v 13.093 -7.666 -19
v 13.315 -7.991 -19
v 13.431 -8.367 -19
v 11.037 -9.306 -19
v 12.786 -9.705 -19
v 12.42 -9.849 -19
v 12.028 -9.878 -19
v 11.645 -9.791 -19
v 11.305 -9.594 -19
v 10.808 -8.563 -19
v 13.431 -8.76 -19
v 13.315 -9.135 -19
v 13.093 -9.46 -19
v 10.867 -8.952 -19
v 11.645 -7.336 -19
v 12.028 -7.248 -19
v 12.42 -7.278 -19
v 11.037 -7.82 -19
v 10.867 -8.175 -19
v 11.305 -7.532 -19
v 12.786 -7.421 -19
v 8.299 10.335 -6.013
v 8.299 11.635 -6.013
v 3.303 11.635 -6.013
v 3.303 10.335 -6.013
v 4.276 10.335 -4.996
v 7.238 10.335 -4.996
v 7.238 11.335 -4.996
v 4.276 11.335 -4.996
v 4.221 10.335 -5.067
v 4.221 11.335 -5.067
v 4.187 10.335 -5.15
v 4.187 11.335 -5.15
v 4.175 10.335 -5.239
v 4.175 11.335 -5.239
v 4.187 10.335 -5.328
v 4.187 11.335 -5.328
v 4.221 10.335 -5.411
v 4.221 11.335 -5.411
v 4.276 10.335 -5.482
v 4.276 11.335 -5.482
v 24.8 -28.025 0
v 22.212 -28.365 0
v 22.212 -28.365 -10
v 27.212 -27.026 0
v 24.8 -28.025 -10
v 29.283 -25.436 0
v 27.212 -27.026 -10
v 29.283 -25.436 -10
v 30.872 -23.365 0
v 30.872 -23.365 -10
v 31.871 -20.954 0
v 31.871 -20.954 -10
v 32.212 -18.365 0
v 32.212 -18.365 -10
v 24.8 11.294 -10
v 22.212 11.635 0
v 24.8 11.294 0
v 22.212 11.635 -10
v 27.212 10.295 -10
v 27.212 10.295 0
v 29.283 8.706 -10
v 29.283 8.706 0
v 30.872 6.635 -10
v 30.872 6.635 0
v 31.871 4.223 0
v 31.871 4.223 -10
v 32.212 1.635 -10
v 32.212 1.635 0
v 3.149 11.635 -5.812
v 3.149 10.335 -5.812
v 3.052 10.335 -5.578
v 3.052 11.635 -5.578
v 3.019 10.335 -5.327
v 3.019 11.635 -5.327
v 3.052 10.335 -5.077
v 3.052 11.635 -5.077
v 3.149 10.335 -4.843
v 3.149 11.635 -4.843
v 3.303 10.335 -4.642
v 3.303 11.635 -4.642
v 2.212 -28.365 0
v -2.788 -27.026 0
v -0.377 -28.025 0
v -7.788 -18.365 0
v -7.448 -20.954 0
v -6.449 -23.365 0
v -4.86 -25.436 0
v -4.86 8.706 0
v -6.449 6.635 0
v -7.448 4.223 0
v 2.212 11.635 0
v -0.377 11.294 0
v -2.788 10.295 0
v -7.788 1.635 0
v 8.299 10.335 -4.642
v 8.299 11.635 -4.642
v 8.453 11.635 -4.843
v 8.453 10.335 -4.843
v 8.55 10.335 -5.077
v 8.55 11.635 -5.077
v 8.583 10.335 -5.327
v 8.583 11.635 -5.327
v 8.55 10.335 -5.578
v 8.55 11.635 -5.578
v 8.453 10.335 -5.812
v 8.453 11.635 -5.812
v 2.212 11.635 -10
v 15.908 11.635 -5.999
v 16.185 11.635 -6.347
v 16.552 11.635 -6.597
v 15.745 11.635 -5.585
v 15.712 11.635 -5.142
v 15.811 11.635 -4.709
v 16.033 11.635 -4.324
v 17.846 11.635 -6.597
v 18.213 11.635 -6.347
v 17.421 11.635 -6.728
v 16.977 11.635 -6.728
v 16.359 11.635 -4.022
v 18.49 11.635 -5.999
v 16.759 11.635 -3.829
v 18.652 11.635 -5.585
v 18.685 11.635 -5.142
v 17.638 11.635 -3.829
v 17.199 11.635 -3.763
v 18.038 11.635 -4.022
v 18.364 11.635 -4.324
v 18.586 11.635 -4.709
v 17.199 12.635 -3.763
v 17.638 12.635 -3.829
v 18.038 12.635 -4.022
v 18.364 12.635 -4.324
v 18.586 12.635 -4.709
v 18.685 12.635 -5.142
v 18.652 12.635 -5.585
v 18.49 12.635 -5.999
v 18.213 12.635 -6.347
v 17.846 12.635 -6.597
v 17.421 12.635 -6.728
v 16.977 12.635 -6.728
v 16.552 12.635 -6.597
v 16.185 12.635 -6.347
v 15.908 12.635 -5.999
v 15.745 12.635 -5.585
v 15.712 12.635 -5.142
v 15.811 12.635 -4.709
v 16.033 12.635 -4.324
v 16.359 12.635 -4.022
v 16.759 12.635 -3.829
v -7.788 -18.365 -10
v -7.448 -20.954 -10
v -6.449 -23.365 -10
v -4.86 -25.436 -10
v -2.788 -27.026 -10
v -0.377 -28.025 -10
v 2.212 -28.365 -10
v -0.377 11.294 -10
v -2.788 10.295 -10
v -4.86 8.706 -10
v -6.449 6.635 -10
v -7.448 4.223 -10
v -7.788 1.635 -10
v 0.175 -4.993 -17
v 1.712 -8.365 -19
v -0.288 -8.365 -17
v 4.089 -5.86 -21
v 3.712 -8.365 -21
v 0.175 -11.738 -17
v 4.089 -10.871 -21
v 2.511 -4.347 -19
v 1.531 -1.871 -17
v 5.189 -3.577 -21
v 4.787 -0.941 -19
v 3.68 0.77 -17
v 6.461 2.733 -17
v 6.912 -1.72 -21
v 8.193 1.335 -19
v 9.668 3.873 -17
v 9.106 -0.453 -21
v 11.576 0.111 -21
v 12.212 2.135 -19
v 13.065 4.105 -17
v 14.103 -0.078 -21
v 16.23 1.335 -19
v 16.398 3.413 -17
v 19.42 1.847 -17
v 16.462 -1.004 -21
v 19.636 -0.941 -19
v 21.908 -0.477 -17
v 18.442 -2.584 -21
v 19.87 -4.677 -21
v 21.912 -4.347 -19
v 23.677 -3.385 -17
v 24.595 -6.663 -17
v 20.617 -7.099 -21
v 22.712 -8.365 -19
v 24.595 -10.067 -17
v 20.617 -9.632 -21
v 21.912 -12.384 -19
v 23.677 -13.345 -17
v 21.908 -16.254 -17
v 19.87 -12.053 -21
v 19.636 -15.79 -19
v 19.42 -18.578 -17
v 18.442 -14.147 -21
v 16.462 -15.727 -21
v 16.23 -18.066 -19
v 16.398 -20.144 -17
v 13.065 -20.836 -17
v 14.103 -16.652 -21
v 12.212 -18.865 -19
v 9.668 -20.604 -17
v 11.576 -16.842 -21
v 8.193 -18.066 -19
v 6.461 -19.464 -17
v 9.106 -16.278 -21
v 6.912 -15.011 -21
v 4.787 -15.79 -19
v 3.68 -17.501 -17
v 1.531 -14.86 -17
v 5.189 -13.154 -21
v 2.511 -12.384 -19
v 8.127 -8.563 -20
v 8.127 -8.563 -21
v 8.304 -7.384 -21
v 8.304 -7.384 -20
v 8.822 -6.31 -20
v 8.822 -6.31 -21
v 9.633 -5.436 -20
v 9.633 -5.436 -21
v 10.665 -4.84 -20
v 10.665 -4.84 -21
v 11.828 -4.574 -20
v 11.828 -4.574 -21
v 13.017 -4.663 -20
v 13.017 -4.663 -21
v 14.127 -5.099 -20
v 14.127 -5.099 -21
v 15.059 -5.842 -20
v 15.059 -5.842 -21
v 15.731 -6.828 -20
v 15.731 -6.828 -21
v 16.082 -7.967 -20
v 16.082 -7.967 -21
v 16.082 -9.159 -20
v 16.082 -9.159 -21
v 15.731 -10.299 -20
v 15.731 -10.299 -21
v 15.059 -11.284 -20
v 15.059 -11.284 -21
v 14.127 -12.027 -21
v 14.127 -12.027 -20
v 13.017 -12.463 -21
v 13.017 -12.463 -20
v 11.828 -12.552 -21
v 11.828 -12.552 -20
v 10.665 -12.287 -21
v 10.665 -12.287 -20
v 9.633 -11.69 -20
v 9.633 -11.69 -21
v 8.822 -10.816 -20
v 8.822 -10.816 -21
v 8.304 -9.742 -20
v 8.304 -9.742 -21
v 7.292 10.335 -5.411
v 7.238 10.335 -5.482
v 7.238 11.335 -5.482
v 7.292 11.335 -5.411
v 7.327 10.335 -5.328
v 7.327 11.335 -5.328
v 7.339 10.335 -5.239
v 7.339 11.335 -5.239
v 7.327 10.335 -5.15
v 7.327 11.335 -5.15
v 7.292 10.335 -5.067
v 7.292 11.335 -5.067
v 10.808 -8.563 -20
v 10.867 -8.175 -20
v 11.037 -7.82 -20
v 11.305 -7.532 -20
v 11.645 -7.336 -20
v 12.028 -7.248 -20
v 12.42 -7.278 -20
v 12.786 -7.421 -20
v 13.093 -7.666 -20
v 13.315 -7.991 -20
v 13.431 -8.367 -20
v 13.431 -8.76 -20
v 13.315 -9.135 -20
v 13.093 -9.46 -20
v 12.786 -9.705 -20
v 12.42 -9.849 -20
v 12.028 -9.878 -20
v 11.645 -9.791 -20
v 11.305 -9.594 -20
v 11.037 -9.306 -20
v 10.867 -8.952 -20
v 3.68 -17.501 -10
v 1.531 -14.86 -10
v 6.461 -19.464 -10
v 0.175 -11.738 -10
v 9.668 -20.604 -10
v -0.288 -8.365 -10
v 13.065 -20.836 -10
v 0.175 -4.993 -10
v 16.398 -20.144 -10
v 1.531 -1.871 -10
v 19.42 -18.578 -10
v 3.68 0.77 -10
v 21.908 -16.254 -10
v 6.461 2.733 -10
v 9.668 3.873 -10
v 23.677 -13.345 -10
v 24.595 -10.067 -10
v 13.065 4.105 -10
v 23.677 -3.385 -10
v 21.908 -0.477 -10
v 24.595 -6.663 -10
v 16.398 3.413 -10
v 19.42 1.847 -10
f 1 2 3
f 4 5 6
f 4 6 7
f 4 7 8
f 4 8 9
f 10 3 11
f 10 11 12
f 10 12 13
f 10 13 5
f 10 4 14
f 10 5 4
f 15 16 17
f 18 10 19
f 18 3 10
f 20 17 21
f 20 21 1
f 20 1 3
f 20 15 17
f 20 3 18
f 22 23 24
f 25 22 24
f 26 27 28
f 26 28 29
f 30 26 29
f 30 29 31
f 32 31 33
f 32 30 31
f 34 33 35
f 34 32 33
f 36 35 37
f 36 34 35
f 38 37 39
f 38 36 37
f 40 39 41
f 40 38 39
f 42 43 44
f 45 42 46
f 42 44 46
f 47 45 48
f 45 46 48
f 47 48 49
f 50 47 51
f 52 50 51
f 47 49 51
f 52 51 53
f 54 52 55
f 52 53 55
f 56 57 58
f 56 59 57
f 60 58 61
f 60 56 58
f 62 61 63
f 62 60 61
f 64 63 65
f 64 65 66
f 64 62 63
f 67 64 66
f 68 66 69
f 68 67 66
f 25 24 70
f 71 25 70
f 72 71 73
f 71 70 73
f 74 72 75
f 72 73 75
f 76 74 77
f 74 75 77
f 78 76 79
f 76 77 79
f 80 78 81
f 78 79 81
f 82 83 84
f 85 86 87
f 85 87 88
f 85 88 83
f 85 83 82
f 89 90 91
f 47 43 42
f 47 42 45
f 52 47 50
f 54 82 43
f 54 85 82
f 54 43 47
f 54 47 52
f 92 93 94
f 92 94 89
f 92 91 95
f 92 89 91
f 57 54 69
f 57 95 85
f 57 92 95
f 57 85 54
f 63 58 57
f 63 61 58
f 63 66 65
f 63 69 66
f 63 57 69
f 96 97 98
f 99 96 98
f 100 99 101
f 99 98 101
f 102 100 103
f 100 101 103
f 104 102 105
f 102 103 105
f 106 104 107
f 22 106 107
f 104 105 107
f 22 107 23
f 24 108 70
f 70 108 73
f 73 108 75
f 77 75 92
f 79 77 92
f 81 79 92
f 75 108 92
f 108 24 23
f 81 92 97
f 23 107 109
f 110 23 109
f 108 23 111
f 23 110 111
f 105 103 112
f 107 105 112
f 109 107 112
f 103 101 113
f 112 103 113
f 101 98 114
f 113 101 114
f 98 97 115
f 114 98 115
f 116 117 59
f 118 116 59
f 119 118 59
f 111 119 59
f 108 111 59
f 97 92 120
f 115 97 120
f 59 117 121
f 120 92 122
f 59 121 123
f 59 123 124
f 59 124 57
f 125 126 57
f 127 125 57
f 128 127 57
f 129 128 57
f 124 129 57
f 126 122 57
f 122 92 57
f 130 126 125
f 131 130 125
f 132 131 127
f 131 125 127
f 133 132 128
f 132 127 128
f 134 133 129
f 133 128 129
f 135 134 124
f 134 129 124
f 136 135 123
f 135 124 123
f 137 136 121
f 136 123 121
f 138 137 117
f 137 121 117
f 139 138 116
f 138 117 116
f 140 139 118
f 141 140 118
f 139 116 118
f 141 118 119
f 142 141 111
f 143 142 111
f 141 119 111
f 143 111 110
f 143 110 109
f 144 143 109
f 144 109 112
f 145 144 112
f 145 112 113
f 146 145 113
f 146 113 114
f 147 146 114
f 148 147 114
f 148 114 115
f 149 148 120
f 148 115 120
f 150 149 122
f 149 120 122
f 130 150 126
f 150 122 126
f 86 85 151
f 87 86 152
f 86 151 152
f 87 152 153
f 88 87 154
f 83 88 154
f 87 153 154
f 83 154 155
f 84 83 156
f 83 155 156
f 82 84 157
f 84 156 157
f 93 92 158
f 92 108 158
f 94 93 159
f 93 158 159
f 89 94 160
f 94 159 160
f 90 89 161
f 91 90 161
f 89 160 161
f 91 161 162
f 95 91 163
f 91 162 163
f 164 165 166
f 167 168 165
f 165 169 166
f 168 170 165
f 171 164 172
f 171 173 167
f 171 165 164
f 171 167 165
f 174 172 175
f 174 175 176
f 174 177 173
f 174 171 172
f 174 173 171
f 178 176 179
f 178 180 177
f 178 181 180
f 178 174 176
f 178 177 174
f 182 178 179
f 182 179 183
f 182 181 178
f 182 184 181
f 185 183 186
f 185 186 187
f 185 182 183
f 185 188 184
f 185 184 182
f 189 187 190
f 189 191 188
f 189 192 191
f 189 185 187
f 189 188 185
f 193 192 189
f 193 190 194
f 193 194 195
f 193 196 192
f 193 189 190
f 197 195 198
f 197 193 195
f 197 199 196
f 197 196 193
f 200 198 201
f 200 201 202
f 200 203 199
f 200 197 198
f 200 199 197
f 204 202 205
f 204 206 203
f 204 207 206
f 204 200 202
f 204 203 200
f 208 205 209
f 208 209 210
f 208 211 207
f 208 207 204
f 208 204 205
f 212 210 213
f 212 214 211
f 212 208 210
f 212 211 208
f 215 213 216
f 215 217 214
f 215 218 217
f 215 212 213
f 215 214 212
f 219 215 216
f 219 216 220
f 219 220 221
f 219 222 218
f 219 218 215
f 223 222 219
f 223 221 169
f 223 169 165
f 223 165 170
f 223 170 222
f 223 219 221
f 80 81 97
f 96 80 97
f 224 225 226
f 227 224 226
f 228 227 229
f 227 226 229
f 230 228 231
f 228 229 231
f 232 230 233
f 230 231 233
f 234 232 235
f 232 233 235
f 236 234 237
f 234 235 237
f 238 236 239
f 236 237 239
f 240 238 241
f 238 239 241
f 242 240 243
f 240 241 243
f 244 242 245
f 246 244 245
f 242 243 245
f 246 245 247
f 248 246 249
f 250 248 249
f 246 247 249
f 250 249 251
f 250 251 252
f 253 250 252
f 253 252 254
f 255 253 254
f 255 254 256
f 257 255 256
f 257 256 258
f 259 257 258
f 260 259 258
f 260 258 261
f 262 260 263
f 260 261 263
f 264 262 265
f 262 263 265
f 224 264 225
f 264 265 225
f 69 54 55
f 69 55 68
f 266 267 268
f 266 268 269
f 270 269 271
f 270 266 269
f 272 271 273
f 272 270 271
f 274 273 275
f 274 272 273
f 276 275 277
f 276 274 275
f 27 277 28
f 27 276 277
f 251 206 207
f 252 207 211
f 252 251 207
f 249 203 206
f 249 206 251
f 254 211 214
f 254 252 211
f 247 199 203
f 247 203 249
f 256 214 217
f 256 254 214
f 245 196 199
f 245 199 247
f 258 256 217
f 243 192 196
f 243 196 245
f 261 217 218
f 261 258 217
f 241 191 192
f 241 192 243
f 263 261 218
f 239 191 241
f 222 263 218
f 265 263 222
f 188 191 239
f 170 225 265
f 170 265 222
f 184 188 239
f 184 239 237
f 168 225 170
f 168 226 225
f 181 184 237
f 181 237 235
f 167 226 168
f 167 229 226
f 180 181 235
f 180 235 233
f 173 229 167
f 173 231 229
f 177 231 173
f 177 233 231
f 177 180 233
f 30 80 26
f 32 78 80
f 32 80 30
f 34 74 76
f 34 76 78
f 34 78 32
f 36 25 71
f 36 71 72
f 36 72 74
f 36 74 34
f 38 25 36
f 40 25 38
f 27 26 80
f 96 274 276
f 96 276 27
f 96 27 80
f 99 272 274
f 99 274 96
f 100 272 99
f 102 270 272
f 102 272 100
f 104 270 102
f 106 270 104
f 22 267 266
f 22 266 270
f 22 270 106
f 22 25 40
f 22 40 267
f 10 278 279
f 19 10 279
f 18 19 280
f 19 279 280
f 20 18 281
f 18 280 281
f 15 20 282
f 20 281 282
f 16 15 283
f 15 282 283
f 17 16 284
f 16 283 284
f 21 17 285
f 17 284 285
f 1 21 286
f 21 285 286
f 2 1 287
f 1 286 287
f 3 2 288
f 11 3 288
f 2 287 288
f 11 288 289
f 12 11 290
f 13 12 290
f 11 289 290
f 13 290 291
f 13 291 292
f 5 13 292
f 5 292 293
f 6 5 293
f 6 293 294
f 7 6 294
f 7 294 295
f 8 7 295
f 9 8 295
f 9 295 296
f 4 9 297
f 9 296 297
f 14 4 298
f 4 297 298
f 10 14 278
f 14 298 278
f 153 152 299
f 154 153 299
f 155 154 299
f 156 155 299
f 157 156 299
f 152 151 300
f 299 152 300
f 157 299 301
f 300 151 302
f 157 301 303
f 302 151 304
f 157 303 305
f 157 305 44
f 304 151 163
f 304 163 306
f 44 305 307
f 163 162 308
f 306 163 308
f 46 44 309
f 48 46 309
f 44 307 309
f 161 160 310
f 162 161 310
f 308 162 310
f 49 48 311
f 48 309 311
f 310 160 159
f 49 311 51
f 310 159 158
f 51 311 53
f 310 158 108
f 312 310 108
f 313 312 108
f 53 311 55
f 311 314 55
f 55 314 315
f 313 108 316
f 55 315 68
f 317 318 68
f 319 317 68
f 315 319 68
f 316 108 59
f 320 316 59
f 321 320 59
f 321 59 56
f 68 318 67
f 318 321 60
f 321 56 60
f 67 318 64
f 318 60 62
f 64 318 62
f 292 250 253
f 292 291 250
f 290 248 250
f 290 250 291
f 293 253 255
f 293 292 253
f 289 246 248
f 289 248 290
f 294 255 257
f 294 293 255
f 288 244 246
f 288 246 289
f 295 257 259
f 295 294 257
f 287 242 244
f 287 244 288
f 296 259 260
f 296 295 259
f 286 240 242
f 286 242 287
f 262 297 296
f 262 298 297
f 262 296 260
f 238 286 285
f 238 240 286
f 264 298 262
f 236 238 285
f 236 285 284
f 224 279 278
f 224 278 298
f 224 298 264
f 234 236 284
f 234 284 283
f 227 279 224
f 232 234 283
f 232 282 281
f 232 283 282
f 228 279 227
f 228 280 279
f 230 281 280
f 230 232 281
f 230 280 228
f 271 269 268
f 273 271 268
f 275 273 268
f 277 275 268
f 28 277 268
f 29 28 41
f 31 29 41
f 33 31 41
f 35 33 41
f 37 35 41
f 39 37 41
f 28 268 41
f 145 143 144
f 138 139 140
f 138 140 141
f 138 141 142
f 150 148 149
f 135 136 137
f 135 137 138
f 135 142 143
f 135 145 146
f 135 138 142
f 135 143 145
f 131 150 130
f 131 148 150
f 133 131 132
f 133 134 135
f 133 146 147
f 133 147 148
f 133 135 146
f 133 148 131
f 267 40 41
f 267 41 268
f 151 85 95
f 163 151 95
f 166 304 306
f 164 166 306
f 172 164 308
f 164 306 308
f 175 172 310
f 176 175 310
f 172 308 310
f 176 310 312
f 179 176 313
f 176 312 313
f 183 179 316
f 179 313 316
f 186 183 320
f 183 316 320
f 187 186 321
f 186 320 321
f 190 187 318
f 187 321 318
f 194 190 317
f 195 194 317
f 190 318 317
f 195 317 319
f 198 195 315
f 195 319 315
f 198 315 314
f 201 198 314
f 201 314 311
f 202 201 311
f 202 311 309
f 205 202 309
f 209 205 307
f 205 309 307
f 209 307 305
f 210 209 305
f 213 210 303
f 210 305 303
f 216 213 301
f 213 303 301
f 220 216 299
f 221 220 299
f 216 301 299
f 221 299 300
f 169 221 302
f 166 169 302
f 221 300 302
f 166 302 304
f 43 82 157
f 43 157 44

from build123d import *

# Parameters (mm, degrees)
SKETCH1_W           = 40
SKETCH1_H           = 40
BOSS_EXTRUDE2_DEPTH = 10
SKETCH7_R           = 12.5
BOSS_EXTRUDE3_DEPTH = 11
CHAMFER4_SIZE       = 4
SKETCH10_R          = 4
CUT_EXTRUDE2_DEPTH  = 1
SKETCH11_R          = 2.5
CUT_EXTRUDE3_DEPTH  = 2
FILLET2_R           = 10
FILLET3_R           = 10
FILLET4_R           = 10
FILLET5_R           = 10
CUT_EXTRUDE4_DEPTH  = 1.3
BOSS_EXTRUDE5_DEPTH = 1
SKETCH16_R          = 1.490769086
BOSS_EXTRUDE6_DEPTH = 1
SKETCH17_R          = 1.318486688
CUT_EXTRUDE5_DEPTH  = 1


with BuildPart() as part:
    # Sketch1 → Boss-Extrude2 (new body)
    with BuildSketch(Plane.XY):
        with Locations((12.211538462, -8.365384615)):
            Rectangle(SKETCH1_W, SKETCH1_H)
    extrude(amount=-BOSS_EXTRUDE2_DEPTH)

    # Sketch7 → Boss-Extrude3 (add)
    with BuildSketch(Plane(origin=(0, 0, -10), x_dir=(-1, 0, 0), z_dir=(0, 0, -1))):
        with Locations((-12.211538462, -8.365384615)):
            Circle(SKETCH7_R)
    extrude(amount=BOSS_EXTRUDE3_DEPTH)

    # Chamfer4
    chamfer4_edges = [part.edges().sort_by_distance(p)[0] for p in [
        (24.711538462, -8.365384615, -21),
    ]]
    chamfer(chamfer4_edges, length=CHAMFER4_SIZE)

    # Sketch10 → Cut-Extrude2 (cut)
    with BuildSketch(Plane(origin=(0, 0, -21), x_dir=(-1, 0, 0), z_dir=(0, 0, -1))):
        with Locations((-12.126772213, -8.563172529)):
            Circle(SKETCH10_R)
    extrude(amount=-CUT_EXTRUDE2_DEPTH, mode=Mode.SUBTRACT)

    # Sketch11 → Cut-Extrude3 (cut)
    with BuildSketch(Plane.XY):
        with Locations((-3.809282546, 7.542414728)):
            Circle(SKETCH11_R)
    extrude(amount=-CUT_EXTRUDE3_DEPTH, mode=Mode.SUBTRACT)

    # Fillet2
    fillet2_edges = [part.edges().sort_by_distance(p)[0] for p in [
        (32.211538462, 11.634615385, -5),
    ]]
    fillet(fillet2_edges, radius=FILLET2_R)

    # Fillet3
    fillet3_edges = [part.edges().sort_by_distance(p)[0] for p in [
        (-7.788461538, 11.634615385, -5),
    ]]
    fillet(fillet3_edges, radius=FILLET3_R)

    # Fillet4
    fillet4_edges = [part.edges().sort_by_distance(p)[0] for p in [
        (-7.788461538, -28.365384615, -5),
    ]]
    fillet(fillet4_edges, radius=FILLET4_R)

    # Fillet5
    fillet5_edges = [part.edges().sort_by_distance(p)[0] for p in [
        (32.211538462, -28.365384615, -5),
    ]]
    fillet(fillet5_edges, radius=FILLET5_R)

    # Sketch13 → Cut-Extrude4 (cut)
    with BuildSketch(Plane(origin=(0, 11.634615385, 0), x_dir=(1, 0, 0), z_dir=(0, 1, 0))):
        with BuildLine():
            Line((3.30309253, 4.642088904), (8.298895956, 4.642088904))
            ThreePointArc((8.298895956, 4.642088904), (8.582742042, 5.327353975), (8.298895956, 6.012619047))
            Line((8.298895956, 6.012619047), (3.30309253, 6.012619047))
            ThreePointArc((3.30309253, 6.012619047), (3.019246443, 5.327353975), (3.30309253, 4.642088904))
        make_face()
    extrude(amount=-CUT_EXTRUDE4_DEPTH, mode=Mode.SUBTRACT)

    # Sketch14 → Boss-Extrude5 (add)
    with BuildSketch(Plane(origin=(0, 10.334615385, 0), x_dir=(1, 0, 0), z_dir=(0, 1, 0))):
        with BuildLine():
            Line((4.275726825, 5.482091249), (7.237840361, 5.482091249))
            ThreePointArc((7.237840361, 5.482091249), (7.33855994, 5.238932676), (7.237840361, 4.995774102))
            Line((7.237840361, 4.995774102), (4.275726825, 4.995774102))
            ThreePointArc((4.275726825, 4.995774102), (4.175007246, 5.238932676), (4.275726825, 5.482091249))
        make_face()
    extrude(amount=BOSS_EXTRUDE5_DEPTH)

    # Sketch16 → Boss-Extrude6 (add)
    with BuildSketch(Plane(origin=(0, 11.634615385, 0), x_dir=(1, 0, 0), z_dir=(0, 1, 0))):
        with Locations(Location((17.198709177, 5.253755482, 0), (0, 0, 270))):
            Circle(SKETCH16_R)
    extrude(amount=BOSS_EXTRUDE6_DEPTH)

    # Sketch17 → Cut-Extrude5 (cut)
    with BuildSketch(Plane(origin=(0, 0, -20), x_dir=(-1, 0, 0), z_dir=(0, 0, -1))):
        with Locations((-12.126772213, -8.563172529)):
            Circle(SKETCH17_R)
    extrude(amount=-CUT_EXTRUDE5_DEPTH, mode=Mode.SUBTRACT)


solid = part.part
